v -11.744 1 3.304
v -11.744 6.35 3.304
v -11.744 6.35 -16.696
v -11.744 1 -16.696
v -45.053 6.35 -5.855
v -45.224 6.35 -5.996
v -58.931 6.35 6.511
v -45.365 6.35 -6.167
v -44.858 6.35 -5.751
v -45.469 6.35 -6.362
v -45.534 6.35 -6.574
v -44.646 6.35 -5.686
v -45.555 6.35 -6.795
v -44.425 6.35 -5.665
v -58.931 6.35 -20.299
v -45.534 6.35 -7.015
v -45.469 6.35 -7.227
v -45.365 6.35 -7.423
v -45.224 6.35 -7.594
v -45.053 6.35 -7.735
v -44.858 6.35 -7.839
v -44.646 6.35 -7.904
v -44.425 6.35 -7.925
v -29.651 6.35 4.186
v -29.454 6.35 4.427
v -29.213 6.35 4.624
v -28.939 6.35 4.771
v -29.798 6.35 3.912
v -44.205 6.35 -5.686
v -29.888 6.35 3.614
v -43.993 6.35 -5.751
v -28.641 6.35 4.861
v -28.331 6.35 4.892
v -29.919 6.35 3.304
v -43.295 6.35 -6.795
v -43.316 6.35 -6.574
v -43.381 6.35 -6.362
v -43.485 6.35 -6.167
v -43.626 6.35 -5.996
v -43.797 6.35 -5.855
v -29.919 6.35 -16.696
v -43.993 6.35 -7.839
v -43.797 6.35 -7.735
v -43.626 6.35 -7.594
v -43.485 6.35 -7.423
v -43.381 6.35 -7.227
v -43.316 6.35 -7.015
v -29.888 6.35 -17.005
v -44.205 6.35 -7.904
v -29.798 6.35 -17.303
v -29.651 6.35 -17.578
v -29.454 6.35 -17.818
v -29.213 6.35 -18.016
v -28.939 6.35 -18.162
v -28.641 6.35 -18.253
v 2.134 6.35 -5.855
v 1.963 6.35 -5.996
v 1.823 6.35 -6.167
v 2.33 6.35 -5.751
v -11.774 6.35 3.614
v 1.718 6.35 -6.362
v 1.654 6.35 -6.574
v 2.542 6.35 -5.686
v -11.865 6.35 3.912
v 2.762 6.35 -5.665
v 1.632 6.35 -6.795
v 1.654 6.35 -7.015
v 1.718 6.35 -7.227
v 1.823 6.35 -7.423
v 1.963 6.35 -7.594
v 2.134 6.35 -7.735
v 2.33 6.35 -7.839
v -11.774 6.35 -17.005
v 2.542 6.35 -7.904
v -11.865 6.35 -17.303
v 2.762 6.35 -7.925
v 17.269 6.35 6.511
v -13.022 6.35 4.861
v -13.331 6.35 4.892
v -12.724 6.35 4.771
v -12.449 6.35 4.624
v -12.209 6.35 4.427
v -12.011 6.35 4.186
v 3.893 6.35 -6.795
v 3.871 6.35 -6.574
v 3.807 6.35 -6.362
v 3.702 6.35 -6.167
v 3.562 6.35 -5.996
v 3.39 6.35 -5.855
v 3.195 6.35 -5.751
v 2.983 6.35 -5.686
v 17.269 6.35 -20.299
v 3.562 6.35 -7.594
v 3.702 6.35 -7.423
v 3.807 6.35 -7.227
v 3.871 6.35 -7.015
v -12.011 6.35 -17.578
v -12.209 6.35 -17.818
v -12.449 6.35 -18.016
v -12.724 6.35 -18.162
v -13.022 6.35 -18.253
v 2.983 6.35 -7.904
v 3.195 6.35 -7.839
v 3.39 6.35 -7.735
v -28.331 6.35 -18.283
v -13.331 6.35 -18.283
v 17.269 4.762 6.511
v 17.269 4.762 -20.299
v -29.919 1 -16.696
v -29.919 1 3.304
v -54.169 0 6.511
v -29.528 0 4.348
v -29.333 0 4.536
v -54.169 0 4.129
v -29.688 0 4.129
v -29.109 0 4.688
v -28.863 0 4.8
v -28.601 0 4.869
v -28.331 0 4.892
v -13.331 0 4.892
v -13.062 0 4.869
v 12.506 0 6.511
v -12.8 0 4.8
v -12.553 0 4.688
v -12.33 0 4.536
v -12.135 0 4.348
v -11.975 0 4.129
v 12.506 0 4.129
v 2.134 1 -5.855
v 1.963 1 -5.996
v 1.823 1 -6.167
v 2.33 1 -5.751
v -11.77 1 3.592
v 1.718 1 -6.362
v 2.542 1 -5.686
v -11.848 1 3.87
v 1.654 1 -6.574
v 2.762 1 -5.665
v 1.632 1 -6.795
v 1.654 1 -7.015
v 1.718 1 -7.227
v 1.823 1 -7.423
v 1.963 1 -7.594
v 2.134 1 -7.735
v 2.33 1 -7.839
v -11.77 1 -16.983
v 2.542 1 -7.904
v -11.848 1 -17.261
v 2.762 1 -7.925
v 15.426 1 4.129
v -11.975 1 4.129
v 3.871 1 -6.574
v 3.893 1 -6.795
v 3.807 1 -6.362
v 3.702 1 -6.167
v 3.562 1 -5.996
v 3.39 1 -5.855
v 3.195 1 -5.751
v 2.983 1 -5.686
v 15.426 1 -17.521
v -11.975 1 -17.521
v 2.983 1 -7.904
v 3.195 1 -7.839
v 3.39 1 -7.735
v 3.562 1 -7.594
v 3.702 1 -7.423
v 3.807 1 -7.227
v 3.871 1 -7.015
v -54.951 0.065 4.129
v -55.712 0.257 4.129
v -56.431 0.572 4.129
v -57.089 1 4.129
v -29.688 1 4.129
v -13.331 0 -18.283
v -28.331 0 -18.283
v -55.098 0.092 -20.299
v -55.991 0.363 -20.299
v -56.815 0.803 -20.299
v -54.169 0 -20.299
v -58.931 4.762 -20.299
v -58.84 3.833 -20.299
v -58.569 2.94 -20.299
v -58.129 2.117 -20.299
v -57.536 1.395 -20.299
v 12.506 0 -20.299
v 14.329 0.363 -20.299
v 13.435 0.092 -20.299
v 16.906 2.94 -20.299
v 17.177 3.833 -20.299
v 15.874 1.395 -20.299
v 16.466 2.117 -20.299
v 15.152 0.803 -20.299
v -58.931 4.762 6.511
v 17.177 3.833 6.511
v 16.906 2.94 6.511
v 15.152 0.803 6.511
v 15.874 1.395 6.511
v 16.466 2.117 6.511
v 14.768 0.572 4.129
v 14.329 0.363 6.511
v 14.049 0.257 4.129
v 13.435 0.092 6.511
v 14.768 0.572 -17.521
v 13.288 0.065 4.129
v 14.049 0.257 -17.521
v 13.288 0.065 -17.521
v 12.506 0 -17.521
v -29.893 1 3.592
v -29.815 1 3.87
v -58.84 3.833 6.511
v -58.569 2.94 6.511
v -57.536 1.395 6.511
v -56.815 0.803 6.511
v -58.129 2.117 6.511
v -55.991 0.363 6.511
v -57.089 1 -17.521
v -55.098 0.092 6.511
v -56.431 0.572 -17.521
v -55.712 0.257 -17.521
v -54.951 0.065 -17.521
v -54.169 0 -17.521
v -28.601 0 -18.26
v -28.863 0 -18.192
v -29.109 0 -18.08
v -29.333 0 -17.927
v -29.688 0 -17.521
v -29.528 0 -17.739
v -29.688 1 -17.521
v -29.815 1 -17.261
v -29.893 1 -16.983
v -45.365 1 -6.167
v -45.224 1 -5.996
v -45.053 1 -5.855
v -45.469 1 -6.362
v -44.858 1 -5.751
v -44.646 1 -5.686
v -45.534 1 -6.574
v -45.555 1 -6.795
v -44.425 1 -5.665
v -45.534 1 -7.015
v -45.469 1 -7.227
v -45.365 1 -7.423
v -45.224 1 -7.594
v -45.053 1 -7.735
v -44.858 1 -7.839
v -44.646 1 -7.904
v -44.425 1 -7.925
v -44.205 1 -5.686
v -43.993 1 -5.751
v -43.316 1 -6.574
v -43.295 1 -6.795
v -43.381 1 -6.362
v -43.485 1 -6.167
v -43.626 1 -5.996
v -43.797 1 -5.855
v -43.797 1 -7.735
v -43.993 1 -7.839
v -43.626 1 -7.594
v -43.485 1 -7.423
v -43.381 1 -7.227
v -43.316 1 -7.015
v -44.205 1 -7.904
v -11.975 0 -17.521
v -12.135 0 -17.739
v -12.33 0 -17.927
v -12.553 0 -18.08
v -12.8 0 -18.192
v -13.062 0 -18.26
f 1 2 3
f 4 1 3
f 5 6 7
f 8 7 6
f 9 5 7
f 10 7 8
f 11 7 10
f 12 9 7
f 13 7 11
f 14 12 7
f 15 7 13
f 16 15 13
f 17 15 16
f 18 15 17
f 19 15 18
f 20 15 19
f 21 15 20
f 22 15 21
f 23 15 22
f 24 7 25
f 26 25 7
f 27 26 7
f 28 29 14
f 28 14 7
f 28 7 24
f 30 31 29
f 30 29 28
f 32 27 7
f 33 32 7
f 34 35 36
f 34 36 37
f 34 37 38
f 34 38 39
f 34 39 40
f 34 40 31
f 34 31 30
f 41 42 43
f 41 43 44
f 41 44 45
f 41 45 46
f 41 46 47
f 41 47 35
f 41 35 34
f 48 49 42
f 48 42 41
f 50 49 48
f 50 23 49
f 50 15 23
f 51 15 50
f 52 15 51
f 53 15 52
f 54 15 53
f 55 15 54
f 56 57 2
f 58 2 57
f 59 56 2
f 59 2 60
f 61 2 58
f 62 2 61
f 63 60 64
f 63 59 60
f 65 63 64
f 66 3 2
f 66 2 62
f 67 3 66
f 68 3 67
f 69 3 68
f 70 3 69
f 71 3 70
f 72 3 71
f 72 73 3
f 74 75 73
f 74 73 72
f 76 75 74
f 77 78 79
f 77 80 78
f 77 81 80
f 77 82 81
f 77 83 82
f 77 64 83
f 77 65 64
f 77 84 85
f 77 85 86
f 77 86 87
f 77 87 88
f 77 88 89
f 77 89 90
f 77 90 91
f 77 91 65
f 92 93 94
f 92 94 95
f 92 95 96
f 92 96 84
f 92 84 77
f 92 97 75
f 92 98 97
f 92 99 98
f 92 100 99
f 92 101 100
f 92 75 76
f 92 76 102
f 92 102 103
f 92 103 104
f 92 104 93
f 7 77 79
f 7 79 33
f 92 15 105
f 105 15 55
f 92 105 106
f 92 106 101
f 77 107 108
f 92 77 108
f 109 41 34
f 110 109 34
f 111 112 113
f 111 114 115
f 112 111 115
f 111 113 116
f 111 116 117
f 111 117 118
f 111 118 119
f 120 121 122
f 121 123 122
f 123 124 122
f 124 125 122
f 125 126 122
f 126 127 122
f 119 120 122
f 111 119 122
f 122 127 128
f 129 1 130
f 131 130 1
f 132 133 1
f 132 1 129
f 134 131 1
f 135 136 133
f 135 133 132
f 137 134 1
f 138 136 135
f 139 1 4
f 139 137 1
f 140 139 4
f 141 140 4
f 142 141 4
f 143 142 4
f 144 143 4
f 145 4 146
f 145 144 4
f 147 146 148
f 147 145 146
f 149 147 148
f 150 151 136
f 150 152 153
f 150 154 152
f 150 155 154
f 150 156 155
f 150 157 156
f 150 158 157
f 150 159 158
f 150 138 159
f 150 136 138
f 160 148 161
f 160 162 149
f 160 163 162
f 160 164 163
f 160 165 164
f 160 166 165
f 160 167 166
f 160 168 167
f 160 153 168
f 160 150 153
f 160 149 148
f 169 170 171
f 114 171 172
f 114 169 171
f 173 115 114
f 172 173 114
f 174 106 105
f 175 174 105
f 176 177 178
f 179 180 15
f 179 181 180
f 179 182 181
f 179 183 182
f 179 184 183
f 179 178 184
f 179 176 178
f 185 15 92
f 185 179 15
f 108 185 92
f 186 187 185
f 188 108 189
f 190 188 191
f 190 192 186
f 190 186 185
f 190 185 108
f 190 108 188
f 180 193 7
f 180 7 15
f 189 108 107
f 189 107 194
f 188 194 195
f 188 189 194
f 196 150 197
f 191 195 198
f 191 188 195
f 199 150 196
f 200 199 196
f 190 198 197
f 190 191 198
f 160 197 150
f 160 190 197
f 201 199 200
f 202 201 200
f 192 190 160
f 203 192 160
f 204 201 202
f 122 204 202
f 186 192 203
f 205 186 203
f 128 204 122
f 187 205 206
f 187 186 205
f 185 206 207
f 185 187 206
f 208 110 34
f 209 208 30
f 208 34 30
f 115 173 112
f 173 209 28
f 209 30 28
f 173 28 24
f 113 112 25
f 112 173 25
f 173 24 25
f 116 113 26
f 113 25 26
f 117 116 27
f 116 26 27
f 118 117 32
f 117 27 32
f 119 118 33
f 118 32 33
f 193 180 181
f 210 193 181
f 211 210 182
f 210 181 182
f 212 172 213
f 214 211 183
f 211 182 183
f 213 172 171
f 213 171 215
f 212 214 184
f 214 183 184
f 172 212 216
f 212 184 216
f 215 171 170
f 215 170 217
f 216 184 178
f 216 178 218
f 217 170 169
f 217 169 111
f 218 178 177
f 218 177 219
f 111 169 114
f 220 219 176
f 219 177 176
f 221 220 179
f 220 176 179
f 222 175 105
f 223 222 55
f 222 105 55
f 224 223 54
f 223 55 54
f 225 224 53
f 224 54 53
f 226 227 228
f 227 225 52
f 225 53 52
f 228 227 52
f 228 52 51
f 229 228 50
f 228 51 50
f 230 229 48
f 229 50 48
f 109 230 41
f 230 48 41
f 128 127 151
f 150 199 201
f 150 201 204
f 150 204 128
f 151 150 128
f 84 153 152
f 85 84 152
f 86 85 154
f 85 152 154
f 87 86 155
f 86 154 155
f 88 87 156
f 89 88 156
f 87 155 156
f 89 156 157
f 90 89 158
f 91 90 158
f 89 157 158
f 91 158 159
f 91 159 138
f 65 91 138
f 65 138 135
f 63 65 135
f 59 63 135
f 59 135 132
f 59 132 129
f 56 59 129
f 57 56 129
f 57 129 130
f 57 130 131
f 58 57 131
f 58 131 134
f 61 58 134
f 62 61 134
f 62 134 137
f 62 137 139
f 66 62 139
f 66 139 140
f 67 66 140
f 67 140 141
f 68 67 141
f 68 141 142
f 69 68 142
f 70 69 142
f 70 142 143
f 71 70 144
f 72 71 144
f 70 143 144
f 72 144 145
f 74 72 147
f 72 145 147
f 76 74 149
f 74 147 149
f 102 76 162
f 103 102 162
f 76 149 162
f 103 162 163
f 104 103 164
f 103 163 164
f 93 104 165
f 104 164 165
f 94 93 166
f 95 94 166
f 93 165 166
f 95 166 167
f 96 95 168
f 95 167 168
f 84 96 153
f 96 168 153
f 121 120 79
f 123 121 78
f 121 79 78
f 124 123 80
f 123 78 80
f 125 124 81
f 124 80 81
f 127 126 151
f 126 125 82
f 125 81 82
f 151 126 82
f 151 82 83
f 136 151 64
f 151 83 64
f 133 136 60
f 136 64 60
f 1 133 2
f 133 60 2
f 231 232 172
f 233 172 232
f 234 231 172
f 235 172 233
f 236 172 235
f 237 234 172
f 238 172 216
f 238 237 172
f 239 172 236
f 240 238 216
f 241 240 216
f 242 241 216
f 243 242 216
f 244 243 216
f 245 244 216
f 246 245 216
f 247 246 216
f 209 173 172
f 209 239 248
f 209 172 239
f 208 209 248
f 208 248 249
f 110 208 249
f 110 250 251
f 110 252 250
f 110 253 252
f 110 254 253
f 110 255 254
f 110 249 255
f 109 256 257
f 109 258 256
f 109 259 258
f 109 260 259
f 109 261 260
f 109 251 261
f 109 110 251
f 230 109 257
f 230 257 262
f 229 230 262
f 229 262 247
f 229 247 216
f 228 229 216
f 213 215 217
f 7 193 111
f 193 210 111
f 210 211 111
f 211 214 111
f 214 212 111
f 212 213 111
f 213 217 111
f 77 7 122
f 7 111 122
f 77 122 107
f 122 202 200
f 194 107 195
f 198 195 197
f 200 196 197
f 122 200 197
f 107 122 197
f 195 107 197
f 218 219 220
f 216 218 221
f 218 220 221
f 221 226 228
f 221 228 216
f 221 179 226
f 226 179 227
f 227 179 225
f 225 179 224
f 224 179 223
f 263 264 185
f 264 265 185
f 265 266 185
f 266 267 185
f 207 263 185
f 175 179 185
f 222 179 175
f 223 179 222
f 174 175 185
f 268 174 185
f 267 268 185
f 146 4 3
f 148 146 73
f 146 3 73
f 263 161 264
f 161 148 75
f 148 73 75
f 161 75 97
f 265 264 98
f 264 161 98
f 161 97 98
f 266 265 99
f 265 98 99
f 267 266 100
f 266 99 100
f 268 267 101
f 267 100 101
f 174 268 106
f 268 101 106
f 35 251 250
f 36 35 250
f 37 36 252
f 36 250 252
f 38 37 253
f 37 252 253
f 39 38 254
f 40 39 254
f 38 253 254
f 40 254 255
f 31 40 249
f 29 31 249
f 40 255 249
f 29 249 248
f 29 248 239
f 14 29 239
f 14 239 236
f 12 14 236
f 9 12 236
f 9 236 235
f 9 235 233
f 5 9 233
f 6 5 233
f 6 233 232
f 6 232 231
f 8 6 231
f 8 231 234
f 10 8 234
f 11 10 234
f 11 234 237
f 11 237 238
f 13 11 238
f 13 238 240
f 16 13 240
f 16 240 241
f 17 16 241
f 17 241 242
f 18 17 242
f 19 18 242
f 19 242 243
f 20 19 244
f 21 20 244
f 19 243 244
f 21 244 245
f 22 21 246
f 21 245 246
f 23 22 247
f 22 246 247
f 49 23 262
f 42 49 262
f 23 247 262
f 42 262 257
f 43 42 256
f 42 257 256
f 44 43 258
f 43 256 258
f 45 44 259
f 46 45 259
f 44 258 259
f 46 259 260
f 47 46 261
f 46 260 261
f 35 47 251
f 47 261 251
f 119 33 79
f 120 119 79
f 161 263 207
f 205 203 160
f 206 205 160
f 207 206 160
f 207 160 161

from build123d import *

# Parameters (mm, degrees)
SKETCH1_W               = 76.2
SKETCH1_H               = 26.809375
BOSS_EXTRUDE1_DEPTH     = 6.35
FILLET1_R               = 4.7625
SKETCH2_W               = 21.65
SKETCH2_H               = 1
CUT_EXTRUDE1_DEPTH      = 80.112608871
CUT_EXTRUDE2_DEPTH      = 63.558479955
CUT_EXTRUDE2_DEPTH_BACK = 63.558479955
F_4_40_TAPPED_HOLE1_D   = 2.2606


with BuildPart() as part:
    # Sketch1 → Boss-Extrude1 (new body)
    with BuildSketch(Plane(origin=(0, 0, 0), x_dir=(1, 0, 0), z_dir=(0, 1, 0))):
        with Locations((-20.831303498, 6.894139619)):
            Rectangle(SKETCH1_W, SKETCH1_H)
    extrude(amount=BOSS_EXTRUDE1_DEPTH)

    # Fillet1
    fillet1_edges = [part.edges().sort_by_distance(p)[0] for p in [
        (-58.931303498, 0, -6.894139619),
        (17.268696502, 0, -6.894139619),
    ]]
    fillet(fillet1_edges, radius=FILLET1_R)

    # Sketch2 → Cut-Extrude1 (cut, through all)
    with BuildSketch(Plane(origin=(17.268696502, 0, 0), x_dir=(0, 0, -1), z_dir=(1, 0, 0))):
        with Locations((6.695702119, 0.5)):
            Rectangle(SKETCH2_W, SKETCH2_H)
    extrude(amount=-CUT_EXTRUDE1_DEPTH, mode=Mode.SUBTRACT)

    # Sketch3 → Cut-Extrude2 (cut, two sides: drawn at the far end of the back side and taken through both)
    with BuildSketch(Plane.XZ.offset(-1).offset(-CUT_EXTRUDE2_DEPTH_BACK)):
        with BuildLine():
            Line((-11.743803498, 3.304297881), (-11.743803498, -16.695702119))
            ThreePointArc((-11.743803498, -16.695702119), (-12.208771483, -17.818234134), (-13.331303498, -18.283202119))
            Line((-13.331303498, -18.283202119), (-28.331303498, -18.283202119))
            ThreePointArc((-28.331303498, -18.283202119), (-29.453835513, -17.818234134), (-29.918803498, -16.695702119))
            Line((-29.918803498, -16.695702119), (-29.918803498, 3.304297881))
            ThreePointArc((-29.918803498, 3.304297881), (-29.453835513, 4.426829896), (-28.331303498, 4.891797881))
            Line((-28.331303498, 4.891797881), (-13.331303498, 4.891797881))
            ThreePointArc((-13.331303498, 4.891797881), (-12.208771483, 4.426829896), (-11.743803498, 3.304297881))
        make_face()
    extrude(amount=CUT_EXTRUDE2_DEPTH + CUT_EXTRUDE2_DEPTH_BACK, mode=Mode.SUBTRACT)

    # #4-40 Tapped Hole1 (through all)
    with Locations(Plane(origin=(0, 6.35, 0), x_dir=(-1, 0, 0), z_dir=(0, 1, 0))):
        with Locations((44.425053498, -6.794920869), (-2.762446502, -6.794920869)):
            Hole(F_4_40_TAPPED_HOLE1_D / 2)


solid = part.part
